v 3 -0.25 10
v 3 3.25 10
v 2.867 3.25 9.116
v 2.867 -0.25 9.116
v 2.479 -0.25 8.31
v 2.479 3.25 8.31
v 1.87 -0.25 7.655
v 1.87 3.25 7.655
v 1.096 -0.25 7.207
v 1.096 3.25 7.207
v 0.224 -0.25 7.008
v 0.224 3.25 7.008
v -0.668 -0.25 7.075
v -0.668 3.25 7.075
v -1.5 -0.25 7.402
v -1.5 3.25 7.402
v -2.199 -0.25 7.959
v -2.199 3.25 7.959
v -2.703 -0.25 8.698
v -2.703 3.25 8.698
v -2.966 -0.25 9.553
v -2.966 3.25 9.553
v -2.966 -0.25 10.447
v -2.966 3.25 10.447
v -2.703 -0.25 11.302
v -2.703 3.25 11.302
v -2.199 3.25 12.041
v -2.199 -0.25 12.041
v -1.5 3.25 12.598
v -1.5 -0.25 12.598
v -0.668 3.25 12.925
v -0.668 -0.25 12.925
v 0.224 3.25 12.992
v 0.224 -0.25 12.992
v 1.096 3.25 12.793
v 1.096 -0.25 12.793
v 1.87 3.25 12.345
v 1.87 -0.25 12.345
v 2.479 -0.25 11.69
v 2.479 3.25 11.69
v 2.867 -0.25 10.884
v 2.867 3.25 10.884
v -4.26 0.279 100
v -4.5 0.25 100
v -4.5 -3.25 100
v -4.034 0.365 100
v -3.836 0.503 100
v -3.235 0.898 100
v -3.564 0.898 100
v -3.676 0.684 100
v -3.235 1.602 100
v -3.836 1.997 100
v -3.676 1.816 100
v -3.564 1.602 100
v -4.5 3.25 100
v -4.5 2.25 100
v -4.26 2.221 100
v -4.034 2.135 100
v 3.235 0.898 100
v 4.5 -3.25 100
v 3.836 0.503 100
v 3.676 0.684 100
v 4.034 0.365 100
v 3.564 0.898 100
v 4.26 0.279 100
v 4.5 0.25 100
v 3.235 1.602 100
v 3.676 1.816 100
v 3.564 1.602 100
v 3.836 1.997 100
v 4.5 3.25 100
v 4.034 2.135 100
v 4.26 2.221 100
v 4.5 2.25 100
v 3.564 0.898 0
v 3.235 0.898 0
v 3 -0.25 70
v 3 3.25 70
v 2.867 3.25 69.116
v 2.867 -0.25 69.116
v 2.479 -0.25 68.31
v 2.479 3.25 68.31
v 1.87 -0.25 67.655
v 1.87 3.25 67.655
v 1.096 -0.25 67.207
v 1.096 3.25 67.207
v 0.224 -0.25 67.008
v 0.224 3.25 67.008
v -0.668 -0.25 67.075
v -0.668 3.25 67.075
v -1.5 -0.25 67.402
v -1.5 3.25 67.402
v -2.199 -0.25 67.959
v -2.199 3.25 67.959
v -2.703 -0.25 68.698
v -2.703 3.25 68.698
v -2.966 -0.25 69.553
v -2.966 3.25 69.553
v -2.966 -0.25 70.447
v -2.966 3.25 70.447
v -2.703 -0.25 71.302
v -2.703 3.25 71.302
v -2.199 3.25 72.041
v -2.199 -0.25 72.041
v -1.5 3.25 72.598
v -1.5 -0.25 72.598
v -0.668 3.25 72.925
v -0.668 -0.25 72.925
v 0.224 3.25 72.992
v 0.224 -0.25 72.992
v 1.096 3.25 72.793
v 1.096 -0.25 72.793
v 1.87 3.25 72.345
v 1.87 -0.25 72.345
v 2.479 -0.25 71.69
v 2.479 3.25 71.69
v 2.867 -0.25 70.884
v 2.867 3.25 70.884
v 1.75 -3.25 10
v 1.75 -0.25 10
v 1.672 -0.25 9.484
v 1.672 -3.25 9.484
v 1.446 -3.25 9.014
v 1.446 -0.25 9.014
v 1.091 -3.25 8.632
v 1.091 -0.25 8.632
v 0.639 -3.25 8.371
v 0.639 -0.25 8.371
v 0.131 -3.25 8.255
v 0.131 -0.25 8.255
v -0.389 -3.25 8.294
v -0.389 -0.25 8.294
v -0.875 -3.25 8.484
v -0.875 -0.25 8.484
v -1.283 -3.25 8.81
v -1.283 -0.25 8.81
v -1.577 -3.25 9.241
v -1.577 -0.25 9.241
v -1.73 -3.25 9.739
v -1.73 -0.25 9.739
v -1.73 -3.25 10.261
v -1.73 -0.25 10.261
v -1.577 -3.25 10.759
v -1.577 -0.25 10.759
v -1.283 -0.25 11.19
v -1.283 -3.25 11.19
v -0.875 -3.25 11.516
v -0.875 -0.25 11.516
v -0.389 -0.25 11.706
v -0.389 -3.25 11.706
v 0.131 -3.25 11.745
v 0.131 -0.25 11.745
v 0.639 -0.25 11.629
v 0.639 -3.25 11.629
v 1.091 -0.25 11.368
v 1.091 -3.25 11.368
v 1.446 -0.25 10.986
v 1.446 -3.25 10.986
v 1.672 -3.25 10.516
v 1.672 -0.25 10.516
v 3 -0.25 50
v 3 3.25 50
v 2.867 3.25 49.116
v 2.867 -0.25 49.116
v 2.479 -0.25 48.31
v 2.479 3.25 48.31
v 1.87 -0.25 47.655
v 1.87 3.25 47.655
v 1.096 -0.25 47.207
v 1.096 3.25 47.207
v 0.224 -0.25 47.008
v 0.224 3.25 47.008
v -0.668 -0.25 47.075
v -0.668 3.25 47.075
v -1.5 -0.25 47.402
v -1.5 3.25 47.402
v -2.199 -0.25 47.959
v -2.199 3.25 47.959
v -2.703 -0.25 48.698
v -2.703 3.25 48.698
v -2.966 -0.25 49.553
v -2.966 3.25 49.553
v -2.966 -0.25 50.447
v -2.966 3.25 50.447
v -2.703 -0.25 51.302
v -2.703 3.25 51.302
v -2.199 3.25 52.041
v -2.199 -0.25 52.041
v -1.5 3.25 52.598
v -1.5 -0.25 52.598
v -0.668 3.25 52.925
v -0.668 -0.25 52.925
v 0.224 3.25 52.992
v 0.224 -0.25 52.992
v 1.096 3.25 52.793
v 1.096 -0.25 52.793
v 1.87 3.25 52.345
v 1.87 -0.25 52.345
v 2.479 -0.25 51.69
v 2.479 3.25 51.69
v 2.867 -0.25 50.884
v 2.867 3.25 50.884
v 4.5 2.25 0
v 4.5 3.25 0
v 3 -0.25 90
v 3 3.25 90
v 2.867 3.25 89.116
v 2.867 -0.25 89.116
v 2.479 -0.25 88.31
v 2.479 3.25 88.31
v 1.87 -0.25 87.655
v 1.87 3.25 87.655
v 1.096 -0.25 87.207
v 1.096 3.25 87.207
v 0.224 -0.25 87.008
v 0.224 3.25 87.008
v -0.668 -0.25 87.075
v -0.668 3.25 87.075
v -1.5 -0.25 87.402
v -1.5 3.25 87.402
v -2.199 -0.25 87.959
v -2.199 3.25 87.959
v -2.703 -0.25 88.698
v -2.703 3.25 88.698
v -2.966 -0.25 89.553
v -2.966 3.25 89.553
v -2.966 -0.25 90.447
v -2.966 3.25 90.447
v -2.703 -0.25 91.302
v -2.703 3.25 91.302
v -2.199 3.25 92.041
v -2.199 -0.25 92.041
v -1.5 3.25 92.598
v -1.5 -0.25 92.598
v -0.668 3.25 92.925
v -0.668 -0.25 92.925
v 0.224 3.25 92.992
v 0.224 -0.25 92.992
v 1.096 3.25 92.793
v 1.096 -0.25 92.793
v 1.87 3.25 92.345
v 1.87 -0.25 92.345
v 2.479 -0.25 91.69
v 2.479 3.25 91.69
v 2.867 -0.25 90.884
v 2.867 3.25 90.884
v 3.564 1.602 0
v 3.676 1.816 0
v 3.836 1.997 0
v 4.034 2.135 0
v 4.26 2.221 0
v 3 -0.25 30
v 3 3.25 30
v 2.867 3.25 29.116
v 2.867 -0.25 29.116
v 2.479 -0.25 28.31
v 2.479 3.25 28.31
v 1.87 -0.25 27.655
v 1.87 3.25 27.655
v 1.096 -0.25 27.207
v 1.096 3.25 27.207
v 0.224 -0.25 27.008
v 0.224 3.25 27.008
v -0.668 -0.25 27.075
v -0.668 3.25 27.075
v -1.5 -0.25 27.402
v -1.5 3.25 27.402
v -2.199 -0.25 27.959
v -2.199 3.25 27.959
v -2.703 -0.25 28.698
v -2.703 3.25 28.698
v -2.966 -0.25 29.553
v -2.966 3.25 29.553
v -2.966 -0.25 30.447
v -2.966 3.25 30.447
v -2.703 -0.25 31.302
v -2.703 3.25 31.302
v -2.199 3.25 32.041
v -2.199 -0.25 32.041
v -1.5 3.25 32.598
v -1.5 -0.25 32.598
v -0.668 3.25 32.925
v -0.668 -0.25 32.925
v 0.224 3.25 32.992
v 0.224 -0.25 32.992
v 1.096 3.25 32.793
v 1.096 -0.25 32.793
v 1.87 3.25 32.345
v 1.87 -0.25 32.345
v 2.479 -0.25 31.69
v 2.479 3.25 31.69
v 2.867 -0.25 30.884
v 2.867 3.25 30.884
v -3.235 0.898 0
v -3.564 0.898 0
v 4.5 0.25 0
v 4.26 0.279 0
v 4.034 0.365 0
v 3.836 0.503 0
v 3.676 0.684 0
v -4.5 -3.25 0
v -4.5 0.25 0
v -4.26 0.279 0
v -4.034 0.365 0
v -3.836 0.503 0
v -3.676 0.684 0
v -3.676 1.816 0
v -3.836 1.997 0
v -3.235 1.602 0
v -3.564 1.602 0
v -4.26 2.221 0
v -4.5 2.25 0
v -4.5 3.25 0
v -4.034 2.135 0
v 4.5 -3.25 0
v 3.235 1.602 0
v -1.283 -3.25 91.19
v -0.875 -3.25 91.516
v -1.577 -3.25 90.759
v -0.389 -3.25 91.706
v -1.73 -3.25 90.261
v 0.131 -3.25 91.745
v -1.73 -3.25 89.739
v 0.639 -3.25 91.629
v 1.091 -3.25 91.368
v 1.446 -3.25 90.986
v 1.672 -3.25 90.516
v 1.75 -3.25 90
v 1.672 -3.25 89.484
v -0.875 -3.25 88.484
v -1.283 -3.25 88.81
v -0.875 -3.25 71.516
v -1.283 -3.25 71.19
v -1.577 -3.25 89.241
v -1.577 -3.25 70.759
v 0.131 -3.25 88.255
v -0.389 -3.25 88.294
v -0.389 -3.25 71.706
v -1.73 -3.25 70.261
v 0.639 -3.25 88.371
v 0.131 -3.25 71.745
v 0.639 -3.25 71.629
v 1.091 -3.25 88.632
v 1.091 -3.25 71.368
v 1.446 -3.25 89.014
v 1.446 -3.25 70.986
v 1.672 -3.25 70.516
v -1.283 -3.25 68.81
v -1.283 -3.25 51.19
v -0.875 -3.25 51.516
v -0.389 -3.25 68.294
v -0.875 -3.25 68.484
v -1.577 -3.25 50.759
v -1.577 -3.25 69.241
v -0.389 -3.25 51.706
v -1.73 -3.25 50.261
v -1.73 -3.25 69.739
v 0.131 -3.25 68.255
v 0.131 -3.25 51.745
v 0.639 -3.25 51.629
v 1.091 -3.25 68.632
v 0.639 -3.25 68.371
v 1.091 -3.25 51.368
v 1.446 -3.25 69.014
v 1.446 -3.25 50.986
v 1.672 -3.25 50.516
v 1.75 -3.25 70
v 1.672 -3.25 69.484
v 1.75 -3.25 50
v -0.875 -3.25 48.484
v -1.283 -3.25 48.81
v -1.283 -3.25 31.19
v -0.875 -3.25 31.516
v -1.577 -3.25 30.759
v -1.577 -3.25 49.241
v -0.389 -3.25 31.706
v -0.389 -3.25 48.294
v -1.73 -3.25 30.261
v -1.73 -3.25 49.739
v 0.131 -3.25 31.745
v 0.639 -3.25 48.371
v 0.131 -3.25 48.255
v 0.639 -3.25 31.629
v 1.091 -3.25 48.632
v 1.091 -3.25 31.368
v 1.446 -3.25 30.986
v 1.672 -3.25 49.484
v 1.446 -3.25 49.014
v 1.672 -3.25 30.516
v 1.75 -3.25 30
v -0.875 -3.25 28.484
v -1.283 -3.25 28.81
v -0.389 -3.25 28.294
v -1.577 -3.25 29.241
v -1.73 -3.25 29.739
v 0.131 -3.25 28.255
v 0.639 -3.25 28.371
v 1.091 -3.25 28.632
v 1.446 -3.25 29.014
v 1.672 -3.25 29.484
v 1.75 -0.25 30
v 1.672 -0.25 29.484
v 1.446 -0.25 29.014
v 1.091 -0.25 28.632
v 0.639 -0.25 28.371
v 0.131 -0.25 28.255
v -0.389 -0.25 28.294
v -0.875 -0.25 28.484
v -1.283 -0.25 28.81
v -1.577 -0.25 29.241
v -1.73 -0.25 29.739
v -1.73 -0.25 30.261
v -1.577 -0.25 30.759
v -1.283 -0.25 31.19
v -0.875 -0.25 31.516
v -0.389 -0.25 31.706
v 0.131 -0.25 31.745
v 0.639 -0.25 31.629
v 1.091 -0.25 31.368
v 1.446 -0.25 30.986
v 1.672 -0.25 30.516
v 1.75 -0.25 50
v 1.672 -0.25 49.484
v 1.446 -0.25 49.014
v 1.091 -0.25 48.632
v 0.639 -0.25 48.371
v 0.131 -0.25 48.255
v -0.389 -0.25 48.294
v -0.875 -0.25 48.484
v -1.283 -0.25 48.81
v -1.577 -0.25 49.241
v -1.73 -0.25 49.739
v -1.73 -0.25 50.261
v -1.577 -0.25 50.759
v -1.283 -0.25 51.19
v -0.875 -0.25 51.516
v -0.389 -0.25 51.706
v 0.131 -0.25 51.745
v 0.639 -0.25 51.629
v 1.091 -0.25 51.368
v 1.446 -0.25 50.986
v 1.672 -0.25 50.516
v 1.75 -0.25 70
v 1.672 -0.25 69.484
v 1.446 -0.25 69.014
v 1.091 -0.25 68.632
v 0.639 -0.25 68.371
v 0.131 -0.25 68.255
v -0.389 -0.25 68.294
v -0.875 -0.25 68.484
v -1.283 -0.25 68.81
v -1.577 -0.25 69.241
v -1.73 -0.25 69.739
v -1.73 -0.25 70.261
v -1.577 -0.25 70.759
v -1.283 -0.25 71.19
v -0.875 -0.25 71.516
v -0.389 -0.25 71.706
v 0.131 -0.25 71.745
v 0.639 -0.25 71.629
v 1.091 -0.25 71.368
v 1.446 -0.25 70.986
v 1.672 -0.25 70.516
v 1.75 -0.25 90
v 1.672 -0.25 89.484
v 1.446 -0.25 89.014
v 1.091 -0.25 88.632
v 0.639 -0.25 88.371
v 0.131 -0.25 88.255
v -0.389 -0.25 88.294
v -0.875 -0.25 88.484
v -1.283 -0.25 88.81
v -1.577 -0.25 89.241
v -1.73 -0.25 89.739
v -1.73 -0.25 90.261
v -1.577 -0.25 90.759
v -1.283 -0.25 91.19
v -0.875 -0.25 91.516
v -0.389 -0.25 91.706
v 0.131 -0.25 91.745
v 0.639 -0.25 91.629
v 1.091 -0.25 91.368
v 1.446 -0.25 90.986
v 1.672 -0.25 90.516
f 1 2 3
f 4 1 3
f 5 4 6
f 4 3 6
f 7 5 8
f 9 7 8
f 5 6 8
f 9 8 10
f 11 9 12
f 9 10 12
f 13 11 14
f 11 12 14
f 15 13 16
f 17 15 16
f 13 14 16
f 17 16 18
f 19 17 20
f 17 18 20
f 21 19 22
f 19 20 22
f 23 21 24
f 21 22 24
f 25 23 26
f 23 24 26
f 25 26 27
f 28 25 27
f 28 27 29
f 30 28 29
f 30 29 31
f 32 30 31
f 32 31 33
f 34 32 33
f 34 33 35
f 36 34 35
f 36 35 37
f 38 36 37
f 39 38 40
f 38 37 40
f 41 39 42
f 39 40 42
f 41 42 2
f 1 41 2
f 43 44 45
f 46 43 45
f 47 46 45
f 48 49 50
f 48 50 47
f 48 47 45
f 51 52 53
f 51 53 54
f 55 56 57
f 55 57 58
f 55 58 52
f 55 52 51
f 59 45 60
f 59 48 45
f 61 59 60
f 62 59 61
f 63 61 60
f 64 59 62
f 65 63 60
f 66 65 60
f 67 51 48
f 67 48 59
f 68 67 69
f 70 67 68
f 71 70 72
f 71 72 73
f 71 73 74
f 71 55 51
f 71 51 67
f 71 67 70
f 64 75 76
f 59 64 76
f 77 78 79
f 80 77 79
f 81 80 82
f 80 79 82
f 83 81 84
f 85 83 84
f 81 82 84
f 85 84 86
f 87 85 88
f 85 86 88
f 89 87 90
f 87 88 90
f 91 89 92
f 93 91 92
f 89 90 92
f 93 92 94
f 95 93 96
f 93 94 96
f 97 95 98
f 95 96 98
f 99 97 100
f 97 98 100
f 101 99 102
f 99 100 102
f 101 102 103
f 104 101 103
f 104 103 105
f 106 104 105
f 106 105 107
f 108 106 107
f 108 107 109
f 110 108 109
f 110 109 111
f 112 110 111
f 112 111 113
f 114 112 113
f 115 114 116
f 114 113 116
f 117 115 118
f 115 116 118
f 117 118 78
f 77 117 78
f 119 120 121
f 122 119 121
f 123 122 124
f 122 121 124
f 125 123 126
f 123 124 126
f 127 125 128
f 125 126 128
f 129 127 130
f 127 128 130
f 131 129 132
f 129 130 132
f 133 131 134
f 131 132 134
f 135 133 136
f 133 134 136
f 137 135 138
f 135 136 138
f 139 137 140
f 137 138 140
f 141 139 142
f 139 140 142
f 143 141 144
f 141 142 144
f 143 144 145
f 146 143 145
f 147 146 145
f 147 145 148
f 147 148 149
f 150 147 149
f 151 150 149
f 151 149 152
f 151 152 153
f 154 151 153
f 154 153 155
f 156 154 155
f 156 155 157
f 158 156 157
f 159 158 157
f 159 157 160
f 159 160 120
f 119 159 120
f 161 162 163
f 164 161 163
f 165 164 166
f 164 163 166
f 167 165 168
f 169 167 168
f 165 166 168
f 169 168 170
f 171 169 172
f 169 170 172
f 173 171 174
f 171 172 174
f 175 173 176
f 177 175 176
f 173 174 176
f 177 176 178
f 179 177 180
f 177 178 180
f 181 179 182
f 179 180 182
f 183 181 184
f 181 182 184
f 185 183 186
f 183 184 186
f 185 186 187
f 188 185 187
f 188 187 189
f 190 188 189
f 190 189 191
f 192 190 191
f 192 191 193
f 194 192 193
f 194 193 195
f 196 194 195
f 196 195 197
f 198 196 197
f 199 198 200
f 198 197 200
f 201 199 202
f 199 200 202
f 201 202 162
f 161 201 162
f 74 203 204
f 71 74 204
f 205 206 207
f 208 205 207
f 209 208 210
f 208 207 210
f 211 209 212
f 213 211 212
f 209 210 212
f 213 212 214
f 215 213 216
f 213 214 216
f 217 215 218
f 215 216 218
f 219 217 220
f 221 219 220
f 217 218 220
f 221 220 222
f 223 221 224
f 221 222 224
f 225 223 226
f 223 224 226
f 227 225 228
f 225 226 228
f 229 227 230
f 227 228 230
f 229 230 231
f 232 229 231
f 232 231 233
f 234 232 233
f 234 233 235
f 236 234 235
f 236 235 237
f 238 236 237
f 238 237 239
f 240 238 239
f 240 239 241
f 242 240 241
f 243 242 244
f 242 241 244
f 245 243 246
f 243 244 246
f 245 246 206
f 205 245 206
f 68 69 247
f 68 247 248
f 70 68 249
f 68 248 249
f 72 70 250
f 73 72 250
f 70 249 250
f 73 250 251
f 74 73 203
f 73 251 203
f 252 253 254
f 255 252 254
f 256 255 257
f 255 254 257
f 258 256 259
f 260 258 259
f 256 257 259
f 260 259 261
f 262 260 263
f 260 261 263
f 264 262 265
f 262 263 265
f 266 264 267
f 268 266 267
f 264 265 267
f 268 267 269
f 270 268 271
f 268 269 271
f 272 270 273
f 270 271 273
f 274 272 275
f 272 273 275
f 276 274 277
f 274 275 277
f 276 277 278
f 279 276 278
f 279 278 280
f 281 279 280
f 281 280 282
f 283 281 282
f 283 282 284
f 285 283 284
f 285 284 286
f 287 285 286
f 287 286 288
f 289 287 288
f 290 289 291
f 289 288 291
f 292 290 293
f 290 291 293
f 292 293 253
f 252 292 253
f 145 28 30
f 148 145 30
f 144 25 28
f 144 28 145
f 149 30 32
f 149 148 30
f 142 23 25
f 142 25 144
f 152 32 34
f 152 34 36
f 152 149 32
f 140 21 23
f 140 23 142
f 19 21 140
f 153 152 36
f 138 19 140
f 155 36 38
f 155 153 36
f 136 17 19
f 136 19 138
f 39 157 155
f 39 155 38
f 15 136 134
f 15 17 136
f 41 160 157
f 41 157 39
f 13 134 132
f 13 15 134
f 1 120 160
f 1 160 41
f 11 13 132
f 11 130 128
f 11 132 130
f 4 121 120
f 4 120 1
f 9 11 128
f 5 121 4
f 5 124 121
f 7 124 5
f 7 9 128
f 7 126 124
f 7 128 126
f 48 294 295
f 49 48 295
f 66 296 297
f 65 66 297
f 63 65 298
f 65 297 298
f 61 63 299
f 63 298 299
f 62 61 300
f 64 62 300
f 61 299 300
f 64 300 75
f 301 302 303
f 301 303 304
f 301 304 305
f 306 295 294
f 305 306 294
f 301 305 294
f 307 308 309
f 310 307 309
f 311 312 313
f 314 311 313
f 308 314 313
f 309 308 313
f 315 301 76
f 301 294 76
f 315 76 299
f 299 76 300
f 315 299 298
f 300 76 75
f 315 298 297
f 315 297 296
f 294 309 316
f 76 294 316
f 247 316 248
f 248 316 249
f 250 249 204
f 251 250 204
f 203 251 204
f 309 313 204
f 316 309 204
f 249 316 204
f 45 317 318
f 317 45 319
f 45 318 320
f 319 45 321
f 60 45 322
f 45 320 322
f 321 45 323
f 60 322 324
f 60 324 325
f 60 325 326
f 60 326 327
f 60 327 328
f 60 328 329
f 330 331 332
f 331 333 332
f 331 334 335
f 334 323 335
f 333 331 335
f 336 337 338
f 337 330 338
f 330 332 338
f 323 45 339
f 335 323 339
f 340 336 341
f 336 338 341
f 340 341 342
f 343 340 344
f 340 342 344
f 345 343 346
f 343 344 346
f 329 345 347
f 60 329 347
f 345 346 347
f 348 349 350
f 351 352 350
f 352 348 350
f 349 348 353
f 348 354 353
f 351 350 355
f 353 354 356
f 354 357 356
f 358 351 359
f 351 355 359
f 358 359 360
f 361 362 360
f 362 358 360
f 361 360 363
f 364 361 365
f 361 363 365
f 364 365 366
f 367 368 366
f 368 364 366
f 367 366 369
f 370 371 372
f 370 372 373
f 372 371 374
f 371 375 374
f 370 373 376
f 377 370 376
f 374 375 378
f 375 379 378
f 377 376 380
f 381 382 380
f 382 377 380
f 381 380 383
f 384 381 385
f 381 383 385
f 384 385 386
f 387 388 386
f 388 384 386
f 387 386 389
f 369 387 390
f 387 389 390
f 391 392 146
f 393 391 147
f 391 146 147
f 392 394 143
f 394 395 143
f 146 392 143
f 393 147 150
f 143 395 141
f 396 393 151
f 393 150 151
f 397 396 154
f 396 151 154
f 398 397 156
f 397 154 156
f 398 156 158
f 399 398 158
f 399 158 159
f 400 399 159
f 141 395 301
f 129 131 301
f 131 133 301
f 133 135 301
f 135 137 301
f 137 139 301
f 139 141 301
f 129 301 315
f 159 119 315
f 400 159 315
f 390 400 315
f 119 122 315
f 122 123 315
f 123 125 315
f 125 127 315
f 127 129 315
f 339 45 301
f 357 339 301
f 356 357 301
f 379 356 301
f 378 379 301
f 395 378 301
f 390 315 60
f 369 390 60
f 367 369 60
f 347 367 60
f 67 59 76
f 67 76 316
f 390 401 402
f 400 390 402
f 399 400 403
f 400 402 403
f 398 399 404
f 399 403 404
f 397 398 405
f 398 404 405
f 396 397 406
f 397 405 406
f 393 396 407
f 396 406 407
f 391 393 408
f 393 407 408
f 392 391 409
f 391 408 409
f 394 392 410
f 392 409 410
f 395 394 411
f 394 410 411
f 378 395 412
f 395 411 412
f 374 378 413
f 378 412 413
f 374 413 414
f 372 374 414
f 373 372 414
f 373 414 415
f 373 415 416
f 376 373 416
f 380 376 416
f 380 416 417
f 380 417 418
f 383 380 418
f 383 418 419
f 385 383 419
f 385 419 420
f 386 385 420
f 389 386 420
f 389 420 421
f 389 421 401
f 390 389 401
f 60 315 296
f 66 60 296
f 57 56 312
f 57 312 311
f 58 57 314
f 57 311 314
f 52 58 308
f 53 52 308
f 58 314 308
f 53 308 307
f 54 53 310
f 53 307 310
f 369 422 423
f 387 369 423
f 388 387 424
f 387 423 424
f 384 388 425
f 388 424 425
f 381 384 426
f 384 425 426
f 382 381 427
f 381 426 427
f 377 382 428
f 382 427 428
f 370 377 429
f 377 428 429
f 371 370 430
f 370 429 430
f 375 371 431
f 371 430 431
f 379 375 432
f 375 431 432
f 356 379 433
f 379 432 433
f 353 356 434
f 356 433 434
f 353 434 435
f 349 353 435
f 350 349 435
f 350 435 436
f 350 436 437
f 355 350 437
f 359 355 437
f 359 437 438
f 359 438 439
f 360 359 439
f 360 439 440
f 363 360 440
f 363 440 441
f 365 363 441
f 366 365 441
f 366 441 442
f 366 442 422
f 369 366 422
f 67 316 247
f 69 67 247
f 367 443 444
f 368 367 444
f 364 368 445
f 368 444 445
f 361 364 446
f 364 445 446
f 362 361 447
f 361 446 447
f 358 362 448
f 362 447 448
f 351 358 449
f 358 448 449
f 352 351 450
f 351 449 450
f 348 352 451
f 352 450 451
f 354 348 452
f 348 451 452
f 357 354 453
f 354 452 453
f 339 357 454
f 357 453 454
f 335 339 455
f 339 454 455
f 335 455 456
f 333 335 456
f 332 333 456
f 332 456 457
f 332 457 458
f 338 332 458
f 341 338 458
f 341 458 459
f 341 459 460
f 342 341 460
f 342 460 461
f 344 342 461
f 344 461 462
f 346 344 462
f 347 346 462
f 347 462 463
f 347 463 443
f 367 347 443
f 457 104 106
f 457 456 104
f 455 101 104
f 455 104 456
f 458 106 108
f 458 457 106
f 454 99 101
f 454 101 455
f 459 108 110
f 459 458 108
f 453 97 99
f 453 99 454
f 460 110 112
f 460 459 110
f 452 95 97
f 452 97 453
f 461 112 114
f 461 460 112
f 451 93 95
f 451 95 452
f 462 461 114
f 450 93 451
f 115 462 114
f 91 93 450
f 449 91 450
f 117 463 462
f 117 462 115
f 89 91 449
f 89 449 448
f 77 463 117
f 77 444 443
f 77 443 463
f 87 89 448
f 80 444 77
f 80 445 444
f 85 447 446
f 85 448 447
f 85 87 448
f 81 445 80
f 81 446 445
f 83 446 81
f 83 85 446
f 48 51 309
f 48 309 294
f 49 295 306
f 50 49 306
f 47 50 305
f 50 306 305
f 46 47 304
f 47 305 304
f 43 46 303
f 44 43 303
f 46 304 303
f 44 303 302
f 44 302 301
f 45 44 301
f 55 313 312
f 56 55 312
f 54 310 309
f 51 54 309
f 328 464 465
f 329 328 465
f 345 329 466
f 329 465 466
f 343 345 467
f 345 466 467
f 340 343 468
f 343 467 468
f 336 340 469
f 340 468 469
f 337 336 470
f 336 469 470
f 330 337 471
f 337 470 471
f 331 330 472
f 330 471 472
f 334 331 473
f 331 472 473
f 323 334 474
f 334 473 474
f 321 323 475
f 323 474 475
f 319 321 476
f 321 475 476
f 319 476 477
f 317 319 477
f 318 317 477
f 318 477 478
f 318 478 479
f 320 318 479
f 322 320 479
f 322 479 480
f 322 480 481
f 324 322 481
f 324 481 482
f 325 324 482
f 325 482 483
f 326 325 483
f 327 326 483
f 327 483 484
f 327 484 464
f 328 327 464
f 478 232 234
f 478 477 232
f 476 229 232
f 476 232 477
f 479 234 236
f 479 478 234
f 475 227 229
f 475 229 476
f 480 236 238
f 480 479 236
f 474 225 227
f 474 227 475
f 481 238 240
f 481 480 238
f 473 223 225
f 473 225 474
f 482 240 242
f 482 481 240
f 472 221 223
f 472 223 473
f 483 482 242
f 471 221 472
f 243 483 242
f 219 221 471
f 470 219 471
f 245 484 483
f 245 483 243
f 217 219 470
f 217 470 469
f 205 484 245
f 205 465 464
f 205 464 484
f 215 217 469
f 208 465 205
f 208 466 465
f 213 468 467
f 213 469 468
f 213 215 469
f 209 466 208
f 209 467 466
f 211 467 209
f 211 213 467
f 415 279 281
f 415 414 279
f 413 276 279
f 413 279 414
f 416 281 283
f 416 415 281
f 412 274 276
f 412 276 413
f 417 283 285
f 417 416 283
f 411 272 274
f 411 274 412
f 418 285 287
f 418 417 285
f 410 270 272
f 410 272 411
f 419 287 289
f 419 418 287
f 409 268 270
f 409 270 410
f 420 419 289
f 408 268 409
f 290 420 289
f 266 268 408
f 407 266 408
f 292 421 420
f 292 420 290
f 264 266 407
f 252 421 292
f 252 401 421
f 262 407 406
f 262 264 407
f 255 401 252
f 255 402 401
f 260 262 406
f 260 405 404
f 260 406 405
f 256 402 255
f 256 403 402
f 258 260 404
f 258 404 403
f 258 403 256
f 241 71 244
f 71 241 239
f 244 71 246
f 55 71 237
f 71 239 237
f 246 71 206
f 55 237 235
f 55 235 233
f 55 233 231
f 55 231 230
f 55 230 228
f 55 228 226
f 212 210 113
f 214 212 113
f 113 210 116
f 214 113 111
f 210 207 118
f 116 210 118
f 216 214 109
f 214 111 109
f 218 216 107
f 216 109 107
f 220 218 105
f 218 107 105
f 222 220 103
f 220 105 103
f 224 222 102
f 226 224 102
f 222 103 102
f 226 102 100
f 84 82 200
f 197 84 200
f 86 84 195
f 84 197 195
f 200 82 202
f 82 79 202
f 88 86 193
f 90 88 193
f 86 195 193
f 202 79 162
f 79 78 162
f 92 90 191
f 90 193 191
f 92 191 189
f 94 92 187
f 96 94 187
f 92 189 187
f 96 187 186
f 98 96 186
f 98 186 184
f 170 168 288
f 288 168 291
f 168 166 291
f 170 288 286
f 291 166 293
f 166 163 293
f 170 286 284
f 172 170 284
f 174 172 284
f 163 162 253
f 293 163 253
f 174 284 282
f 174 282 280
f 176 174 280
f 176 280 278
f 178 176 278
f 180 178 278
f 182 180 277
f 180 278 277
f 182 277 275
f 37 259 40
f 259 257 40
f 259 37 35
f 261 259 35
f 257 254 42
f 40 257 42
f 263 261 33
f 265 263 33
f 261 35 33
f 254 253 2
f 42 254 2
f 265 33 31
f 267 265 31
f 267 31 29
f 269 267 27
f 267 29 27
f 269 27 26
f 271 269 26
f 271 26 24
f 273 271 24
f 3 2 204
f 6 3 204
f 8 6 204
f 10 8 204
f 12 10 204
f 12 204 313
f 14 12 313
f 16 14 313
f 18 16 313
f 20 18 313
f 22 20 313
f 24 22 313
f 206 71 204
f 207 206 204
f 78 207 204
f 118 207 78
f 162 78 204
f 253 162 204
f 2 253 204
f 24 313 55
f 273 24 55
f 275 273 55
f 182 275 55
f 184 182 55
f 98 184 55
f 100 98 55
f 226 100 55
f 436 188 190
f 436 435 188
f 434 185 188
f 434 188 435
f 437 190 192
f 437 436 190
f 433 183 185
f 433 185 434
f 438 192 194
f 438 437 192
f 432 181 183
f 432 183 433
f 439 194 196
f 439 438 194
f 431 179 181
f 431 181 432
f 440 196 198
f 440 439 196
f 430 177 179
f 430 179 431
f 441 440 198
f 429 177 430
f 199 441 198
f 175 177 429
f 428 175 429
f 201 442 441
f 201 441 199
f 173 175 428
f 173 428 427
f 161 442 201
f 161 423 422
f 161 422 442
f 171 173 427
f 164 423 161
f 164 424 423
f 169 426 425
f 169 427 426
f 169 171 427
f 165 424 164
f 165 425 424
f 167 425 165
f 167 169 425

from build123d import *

# Parameters (mm, degrees)
EXTRUDE1_DEPTH  = 100
SKETCH2_R       = 3
EXTRUDE2_DEPTH  = 3.5
SKETCH_R        = 1.75
EXTRUDE3_DEPTH  = 7.5
LPATTERN1_COUNT = 13
LPATTERN1_PITCH = 20


with BuildPart() as part:
    # Sketch1 → Extrude1 (new body)
    with BuildSketch(Plane.XY):
        with BuildLine():
            Line((-4.5, -3.25), (4.5, -3.25))
            Line((4.5, -3.25), (4.5, 0.25))
            ThreePointArc((4.5, 0.25), (3.93077967, 0.427814974), (3.563991137, 0.898023568))
            Line((3.563991137, 0.898023568), (3.235073025, 0.898023568))
            Line((3.235073025, 0.898023568), (3.235073025, 1.601976432))
            Line((3.235073025, 1.601976432), (3.563991137, 1.601976432))
            ThreePointArc((3.563991137, 1.601976432), (3.93077967, 2.072185026), (4.5, 2.25))
            Line((4.5, 2.25), (4.5, 3.25))
            Line((4.5, 3.25), (-4.5, 3.25))
            Line((-4.5, 3.25), (-4.5, 2.25))
            ThreePointArc((-4.5, 2.25), (-3.93077967, 2.072185026), (-3.563991137, 1.601976432))
            Line((-3.563991137, 1.601976432), (-3.235073025, 1.601976432))
            Line((-3.235073025, 1.601976432), (-3.235073025, 0.898023568))
            Line((-3.235073025, 0.898023568), (-3.563991137, 0.898023568))
            ThreePointArc((-3.563991137, 0.898023568), (-3.93077967, 0.427814974), (-4.5, 0.25))
            Line((-4.5, 0.25), (-4.5, -3.25))
        make_face()
    extrude(amount=EXTRUDE1_DEPTH)

    # Sketch2 → Extrude2 (cut)
    with BuildSketch(Plane(origin=(0, 3.25, 0), x_dir=(1, 0, 0), z_dir=(0, 1, 0))):
        with Locations((0, -10)):
            Circle(SKETCH2_R)
    extrude2 = extrude(amount=-EXTRUDE2_DEPTH, mode=Mode.SUBTRACT)

    # Sketch → Extrude3 (cut, through all)
    with BuildSketch(Plane(origin=(0, 3.25, 0), x_dir=(1, 0, 0), z_dir=(0, 1, 0))):
        with Locations((0, -10)):
            Circle(SKETCH_R)
    extrude3 = extrude(amount=-EXTRUDE3_DEPTH, mode=Mode.SUBTRACT)

    # LPattern1: Extrude2, Extrude3 ×13
    with Locations(*[(0, 0, i * LPATTERN1_PITCH) for i in range(1, LPATTERN1_COUNT)]):
        add(extrude2, mode=Mode.SUBTRACT)
        add(extrude3, mode=Mode.SUBTRACT)


solid = part.part
